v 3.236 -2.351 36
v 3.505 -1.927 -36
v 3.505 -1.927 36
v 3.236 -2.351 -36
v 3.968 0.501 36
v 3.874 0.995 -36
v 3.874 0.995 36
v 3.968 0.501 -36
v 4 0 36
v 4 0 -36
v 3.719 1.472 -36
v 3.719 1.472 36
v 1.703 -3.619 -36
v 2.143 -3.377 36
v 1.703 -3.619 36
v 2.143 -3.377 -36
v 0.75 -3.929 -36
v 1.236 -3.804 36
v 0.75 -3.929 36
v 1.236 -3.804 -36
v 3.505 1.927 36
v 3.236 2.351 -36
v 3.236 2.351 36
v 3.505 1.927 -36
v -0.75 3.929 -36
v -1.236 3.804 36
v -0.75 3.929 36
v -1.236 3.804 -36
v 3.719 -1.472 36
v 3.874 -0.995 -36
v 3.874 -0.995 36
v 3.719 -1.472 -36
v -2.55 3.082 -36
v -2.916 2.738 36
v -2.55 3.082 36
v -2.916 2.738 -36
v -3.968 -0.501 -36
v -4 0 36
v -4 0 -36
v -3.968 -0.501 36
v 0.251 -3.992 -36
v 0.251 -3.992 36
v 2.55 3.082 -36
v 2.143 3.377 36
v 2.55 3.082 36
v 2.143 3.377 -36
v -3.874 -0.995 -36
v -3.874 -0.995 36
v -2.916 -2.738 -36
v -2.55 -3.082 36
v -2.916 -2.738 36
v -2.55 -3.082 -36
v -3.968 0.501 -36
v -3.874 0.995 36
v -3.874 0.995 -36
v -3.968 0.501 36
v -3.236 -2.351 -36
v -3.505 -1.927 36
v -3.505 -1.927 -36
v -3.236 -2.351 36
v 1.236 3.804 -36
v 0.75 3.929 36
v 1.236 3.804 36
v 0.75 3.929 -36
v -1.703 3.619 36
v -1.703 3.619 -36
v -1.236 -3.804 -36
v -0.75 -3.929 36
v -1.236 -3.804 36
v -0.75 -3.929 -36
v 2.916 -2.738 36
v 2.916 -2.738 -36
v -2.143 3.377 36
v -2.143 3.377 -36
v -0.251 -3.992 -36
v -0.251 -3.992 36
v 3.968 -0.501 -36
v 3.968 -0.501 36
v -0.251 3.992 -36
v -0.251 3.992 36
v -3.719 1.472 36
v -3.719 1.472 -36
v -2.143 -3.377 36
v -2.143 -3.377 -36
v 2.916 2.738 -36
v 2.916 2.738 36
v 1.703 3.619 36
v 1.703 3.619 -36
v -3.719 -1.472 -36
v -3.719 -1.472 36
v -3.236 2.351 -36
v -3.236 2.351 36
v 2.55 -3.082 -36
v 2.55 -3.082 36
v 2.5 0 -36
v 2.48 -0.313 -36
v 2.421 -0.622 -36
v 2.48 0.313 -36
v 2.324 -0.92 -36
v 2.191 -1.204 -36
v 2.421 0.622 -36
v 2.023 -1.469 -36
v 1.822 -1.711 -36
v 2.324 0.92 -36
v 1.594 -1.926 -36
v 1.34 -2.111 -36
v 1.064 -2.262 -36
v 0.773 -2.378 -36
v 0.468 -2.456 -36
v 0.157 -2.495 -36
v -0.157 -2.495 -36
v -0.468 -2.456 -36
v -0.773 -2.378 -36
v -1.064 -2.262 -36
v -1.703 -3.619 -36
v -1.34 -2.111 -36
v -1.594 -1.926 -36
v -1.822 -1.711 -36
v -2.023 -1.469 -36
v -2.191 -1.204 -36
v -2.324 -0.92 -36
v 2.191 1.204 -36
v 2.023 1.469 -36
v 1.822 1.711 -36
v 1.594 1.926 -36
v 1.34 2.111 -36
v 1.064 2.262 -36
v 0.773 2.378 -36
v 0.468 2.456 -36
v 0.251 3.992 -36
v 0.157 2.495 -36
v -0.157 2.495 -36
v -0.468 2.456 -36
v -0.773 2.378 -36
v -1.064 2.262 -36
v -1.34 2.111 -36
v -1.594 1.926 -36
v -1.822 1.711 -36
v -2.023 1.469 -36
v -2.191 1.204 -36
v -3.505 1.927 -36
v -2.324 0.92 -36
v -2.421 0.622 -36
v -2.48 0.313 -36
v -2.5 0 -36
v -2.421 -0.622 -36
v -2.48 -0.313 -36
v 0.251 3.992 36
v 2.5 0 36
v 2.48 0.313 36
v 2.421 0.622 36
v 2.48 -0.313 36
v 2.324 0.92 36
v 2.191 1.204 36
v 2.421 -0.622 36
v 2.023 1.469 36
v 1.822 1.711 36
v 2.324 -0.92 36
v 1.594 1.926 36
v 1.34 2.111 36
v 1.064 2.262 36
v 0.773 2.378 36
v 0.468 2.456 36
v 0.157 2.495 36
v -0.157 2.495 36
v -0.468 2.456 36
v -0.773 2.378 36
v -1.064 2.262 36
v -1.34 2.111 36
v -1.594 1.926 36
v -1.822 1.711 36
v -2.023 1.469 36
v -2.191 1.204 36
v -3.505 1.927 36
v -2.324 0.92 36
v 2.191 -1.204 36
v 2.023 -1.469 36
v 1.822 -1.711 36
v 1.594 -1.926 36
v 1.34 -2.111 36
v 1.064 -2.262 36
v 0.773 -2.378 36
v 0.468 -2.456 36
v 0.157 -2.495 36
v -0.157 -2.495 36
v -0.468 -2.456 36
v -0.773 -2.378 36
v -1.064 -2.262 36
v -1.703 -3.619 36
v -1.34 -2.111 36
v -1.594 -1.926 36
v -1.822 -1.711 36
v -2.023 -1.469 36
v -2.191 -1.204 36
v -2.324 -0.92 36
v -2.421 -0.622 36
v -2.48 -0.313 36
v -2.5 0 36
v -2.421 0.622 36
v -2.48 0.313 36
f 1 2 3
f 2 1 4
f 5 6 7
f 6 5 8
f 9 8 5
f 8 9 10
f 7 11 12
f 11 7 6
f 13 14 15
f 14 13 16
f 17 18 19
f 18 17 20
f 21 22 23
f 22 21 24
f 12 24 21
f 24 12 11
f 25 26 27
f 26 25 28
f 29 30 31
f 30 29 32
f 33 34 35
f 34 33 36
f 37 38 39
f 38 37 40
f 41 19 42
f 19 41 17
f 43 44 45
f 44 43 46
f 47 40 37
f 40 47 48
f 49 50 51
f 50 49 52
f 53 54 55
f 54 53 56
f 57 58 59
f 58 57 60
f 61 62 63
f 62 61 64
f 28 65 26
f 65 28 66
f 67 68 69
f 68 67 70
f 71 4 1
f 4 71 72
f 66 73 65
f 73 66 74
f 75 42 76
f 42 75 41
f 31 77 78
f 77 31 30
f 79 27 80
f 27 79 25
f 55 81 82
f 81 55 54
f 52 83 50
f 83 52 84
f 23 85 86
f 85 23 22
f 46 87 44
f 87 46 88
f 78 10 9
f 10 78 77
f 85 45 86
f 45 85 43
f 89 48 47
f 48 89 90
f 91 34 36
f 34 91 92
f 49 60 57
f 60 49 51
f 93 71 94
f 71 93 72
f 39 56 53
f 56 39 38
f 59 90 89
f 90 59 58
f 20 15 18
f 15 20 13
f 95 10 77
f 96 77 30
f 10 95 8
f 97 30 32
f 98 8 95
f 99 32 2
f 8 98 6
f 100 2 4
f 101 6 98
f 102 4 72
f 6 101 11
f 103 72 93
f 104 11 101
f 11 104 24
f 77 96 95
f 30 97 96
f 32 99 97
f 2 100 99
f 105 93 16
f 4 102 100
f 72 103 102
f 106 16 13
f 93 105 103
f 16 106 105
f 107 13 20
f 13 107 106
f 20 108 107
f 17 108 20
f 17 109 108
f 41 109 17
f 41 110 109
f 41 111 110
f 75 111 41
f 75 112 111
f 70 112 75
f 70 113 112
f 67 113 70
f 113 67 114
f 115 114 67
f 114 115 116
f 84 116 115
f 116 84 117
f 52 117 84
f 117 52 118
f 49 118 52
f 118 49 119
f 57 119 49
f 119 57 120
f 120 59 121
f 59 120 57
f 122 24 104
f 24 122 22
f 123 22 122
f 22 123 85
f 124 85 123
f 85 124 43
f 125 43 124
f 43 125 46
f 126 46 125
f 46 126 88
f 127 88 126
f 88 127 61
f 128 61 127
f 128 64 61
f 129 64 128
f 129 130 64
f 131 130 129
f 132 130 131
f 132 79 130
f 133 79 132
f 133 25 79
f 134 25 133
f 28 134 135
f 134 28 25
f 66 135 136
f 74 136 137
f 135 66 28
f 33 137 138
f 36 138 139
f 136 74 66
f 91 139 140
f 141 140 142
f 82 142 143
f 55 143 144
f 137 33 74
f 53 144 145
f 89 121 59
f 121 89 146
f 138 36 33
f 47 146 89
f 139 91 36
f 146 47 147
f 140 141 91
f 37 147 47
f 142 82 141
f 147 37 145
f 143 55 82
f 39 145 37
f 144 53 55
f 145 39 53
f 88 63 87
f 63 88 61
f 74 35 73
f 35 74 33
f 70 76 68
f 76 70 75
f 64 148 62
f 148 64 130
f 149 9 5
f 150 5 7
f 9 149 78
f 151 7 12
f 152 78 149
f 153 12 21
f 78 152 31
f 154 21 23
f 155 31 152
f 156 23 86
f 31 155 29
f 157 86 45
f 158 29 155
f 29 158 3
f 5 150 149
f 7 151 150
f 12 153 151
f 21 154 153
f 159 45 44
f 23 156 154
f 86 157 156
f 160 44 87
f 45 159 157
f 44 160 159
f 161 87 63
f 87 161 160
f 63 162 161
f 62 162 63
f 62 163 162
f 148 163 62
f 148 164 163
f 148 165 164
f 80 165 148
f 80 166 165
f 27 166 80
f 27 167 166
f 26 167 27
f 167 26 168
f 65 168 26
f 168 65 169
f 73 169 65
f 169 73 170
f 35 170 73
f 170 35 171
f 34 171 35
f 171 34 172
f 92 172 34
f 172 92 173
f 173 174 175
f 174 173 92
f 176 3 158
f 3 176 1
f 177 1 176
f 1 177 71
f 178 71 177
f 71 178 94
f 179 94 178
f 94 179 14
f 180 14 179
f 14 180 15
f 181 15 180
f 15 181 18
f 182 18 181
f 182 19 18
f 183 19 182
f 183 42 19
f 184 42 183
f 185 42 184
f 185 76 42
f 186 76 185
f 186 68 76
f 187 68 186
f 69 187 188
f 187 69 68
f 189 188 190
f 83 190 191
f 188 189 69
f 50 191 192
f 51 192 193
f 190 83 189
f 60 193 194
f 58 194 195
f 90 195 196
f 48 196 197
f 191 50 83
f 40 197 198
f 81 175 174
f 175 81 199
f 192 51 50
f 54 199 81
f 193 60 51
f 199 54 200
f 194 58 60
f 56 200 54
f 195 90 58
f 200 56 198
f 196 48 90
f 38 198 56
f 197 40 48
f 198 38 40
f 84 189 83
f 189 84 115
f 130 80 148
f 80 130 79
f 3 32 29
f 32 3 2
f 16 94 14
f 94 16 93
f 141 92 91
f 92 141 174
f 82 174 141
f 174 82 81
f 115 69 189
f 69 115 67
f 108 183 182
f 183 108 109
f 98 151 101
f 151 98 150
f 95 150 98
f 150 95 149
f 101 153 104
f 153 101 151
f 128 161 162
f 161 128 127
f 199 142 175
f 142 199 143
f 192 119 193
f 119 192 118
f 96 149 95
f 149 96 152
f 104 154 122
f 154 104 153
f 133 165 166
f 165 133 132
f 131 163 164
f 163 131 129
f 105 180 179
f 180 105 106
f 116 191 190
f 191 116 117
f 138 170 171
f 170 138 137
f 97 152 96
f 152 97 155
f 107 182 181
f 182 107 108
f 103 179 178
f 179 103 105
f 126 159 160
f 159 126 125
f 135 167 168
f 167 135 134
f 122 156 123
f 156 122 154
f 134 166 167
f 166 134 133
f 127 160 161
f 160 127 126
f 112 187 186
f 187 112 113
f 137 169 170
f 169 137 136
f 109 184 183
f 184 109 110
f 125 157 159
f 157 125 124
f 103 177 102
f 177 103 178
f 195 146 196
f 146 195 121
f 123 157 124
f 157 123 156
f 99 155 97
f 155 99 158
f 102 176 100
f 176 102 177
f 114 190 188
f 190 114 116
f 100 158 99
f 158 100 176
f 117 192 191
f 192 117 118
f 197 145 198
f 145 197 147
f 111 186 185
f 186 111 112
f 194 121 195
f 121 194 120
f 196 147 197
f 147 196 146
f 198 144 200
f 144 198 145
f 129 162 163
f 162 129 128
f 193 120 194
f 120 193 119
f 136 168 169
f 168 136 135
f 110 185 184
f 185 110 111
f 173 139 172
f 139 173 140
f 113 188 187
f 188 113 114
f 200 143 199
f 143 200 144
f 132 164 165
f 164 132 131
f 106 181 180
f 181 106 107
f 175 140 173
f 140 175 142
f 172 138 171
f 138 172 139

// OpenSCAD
$fn = 50;


difference() {
	union() {
		translate(v = [0, 0, -36.0000000000]) {
			cylinder(h = 72, r = 4.0000000000);
		}
	}
	union() {
		translate(v = [0, 0, -100.0000000000]) {
			cylinder(h = 200, r = 2.5000000000);
		}
	}
}
